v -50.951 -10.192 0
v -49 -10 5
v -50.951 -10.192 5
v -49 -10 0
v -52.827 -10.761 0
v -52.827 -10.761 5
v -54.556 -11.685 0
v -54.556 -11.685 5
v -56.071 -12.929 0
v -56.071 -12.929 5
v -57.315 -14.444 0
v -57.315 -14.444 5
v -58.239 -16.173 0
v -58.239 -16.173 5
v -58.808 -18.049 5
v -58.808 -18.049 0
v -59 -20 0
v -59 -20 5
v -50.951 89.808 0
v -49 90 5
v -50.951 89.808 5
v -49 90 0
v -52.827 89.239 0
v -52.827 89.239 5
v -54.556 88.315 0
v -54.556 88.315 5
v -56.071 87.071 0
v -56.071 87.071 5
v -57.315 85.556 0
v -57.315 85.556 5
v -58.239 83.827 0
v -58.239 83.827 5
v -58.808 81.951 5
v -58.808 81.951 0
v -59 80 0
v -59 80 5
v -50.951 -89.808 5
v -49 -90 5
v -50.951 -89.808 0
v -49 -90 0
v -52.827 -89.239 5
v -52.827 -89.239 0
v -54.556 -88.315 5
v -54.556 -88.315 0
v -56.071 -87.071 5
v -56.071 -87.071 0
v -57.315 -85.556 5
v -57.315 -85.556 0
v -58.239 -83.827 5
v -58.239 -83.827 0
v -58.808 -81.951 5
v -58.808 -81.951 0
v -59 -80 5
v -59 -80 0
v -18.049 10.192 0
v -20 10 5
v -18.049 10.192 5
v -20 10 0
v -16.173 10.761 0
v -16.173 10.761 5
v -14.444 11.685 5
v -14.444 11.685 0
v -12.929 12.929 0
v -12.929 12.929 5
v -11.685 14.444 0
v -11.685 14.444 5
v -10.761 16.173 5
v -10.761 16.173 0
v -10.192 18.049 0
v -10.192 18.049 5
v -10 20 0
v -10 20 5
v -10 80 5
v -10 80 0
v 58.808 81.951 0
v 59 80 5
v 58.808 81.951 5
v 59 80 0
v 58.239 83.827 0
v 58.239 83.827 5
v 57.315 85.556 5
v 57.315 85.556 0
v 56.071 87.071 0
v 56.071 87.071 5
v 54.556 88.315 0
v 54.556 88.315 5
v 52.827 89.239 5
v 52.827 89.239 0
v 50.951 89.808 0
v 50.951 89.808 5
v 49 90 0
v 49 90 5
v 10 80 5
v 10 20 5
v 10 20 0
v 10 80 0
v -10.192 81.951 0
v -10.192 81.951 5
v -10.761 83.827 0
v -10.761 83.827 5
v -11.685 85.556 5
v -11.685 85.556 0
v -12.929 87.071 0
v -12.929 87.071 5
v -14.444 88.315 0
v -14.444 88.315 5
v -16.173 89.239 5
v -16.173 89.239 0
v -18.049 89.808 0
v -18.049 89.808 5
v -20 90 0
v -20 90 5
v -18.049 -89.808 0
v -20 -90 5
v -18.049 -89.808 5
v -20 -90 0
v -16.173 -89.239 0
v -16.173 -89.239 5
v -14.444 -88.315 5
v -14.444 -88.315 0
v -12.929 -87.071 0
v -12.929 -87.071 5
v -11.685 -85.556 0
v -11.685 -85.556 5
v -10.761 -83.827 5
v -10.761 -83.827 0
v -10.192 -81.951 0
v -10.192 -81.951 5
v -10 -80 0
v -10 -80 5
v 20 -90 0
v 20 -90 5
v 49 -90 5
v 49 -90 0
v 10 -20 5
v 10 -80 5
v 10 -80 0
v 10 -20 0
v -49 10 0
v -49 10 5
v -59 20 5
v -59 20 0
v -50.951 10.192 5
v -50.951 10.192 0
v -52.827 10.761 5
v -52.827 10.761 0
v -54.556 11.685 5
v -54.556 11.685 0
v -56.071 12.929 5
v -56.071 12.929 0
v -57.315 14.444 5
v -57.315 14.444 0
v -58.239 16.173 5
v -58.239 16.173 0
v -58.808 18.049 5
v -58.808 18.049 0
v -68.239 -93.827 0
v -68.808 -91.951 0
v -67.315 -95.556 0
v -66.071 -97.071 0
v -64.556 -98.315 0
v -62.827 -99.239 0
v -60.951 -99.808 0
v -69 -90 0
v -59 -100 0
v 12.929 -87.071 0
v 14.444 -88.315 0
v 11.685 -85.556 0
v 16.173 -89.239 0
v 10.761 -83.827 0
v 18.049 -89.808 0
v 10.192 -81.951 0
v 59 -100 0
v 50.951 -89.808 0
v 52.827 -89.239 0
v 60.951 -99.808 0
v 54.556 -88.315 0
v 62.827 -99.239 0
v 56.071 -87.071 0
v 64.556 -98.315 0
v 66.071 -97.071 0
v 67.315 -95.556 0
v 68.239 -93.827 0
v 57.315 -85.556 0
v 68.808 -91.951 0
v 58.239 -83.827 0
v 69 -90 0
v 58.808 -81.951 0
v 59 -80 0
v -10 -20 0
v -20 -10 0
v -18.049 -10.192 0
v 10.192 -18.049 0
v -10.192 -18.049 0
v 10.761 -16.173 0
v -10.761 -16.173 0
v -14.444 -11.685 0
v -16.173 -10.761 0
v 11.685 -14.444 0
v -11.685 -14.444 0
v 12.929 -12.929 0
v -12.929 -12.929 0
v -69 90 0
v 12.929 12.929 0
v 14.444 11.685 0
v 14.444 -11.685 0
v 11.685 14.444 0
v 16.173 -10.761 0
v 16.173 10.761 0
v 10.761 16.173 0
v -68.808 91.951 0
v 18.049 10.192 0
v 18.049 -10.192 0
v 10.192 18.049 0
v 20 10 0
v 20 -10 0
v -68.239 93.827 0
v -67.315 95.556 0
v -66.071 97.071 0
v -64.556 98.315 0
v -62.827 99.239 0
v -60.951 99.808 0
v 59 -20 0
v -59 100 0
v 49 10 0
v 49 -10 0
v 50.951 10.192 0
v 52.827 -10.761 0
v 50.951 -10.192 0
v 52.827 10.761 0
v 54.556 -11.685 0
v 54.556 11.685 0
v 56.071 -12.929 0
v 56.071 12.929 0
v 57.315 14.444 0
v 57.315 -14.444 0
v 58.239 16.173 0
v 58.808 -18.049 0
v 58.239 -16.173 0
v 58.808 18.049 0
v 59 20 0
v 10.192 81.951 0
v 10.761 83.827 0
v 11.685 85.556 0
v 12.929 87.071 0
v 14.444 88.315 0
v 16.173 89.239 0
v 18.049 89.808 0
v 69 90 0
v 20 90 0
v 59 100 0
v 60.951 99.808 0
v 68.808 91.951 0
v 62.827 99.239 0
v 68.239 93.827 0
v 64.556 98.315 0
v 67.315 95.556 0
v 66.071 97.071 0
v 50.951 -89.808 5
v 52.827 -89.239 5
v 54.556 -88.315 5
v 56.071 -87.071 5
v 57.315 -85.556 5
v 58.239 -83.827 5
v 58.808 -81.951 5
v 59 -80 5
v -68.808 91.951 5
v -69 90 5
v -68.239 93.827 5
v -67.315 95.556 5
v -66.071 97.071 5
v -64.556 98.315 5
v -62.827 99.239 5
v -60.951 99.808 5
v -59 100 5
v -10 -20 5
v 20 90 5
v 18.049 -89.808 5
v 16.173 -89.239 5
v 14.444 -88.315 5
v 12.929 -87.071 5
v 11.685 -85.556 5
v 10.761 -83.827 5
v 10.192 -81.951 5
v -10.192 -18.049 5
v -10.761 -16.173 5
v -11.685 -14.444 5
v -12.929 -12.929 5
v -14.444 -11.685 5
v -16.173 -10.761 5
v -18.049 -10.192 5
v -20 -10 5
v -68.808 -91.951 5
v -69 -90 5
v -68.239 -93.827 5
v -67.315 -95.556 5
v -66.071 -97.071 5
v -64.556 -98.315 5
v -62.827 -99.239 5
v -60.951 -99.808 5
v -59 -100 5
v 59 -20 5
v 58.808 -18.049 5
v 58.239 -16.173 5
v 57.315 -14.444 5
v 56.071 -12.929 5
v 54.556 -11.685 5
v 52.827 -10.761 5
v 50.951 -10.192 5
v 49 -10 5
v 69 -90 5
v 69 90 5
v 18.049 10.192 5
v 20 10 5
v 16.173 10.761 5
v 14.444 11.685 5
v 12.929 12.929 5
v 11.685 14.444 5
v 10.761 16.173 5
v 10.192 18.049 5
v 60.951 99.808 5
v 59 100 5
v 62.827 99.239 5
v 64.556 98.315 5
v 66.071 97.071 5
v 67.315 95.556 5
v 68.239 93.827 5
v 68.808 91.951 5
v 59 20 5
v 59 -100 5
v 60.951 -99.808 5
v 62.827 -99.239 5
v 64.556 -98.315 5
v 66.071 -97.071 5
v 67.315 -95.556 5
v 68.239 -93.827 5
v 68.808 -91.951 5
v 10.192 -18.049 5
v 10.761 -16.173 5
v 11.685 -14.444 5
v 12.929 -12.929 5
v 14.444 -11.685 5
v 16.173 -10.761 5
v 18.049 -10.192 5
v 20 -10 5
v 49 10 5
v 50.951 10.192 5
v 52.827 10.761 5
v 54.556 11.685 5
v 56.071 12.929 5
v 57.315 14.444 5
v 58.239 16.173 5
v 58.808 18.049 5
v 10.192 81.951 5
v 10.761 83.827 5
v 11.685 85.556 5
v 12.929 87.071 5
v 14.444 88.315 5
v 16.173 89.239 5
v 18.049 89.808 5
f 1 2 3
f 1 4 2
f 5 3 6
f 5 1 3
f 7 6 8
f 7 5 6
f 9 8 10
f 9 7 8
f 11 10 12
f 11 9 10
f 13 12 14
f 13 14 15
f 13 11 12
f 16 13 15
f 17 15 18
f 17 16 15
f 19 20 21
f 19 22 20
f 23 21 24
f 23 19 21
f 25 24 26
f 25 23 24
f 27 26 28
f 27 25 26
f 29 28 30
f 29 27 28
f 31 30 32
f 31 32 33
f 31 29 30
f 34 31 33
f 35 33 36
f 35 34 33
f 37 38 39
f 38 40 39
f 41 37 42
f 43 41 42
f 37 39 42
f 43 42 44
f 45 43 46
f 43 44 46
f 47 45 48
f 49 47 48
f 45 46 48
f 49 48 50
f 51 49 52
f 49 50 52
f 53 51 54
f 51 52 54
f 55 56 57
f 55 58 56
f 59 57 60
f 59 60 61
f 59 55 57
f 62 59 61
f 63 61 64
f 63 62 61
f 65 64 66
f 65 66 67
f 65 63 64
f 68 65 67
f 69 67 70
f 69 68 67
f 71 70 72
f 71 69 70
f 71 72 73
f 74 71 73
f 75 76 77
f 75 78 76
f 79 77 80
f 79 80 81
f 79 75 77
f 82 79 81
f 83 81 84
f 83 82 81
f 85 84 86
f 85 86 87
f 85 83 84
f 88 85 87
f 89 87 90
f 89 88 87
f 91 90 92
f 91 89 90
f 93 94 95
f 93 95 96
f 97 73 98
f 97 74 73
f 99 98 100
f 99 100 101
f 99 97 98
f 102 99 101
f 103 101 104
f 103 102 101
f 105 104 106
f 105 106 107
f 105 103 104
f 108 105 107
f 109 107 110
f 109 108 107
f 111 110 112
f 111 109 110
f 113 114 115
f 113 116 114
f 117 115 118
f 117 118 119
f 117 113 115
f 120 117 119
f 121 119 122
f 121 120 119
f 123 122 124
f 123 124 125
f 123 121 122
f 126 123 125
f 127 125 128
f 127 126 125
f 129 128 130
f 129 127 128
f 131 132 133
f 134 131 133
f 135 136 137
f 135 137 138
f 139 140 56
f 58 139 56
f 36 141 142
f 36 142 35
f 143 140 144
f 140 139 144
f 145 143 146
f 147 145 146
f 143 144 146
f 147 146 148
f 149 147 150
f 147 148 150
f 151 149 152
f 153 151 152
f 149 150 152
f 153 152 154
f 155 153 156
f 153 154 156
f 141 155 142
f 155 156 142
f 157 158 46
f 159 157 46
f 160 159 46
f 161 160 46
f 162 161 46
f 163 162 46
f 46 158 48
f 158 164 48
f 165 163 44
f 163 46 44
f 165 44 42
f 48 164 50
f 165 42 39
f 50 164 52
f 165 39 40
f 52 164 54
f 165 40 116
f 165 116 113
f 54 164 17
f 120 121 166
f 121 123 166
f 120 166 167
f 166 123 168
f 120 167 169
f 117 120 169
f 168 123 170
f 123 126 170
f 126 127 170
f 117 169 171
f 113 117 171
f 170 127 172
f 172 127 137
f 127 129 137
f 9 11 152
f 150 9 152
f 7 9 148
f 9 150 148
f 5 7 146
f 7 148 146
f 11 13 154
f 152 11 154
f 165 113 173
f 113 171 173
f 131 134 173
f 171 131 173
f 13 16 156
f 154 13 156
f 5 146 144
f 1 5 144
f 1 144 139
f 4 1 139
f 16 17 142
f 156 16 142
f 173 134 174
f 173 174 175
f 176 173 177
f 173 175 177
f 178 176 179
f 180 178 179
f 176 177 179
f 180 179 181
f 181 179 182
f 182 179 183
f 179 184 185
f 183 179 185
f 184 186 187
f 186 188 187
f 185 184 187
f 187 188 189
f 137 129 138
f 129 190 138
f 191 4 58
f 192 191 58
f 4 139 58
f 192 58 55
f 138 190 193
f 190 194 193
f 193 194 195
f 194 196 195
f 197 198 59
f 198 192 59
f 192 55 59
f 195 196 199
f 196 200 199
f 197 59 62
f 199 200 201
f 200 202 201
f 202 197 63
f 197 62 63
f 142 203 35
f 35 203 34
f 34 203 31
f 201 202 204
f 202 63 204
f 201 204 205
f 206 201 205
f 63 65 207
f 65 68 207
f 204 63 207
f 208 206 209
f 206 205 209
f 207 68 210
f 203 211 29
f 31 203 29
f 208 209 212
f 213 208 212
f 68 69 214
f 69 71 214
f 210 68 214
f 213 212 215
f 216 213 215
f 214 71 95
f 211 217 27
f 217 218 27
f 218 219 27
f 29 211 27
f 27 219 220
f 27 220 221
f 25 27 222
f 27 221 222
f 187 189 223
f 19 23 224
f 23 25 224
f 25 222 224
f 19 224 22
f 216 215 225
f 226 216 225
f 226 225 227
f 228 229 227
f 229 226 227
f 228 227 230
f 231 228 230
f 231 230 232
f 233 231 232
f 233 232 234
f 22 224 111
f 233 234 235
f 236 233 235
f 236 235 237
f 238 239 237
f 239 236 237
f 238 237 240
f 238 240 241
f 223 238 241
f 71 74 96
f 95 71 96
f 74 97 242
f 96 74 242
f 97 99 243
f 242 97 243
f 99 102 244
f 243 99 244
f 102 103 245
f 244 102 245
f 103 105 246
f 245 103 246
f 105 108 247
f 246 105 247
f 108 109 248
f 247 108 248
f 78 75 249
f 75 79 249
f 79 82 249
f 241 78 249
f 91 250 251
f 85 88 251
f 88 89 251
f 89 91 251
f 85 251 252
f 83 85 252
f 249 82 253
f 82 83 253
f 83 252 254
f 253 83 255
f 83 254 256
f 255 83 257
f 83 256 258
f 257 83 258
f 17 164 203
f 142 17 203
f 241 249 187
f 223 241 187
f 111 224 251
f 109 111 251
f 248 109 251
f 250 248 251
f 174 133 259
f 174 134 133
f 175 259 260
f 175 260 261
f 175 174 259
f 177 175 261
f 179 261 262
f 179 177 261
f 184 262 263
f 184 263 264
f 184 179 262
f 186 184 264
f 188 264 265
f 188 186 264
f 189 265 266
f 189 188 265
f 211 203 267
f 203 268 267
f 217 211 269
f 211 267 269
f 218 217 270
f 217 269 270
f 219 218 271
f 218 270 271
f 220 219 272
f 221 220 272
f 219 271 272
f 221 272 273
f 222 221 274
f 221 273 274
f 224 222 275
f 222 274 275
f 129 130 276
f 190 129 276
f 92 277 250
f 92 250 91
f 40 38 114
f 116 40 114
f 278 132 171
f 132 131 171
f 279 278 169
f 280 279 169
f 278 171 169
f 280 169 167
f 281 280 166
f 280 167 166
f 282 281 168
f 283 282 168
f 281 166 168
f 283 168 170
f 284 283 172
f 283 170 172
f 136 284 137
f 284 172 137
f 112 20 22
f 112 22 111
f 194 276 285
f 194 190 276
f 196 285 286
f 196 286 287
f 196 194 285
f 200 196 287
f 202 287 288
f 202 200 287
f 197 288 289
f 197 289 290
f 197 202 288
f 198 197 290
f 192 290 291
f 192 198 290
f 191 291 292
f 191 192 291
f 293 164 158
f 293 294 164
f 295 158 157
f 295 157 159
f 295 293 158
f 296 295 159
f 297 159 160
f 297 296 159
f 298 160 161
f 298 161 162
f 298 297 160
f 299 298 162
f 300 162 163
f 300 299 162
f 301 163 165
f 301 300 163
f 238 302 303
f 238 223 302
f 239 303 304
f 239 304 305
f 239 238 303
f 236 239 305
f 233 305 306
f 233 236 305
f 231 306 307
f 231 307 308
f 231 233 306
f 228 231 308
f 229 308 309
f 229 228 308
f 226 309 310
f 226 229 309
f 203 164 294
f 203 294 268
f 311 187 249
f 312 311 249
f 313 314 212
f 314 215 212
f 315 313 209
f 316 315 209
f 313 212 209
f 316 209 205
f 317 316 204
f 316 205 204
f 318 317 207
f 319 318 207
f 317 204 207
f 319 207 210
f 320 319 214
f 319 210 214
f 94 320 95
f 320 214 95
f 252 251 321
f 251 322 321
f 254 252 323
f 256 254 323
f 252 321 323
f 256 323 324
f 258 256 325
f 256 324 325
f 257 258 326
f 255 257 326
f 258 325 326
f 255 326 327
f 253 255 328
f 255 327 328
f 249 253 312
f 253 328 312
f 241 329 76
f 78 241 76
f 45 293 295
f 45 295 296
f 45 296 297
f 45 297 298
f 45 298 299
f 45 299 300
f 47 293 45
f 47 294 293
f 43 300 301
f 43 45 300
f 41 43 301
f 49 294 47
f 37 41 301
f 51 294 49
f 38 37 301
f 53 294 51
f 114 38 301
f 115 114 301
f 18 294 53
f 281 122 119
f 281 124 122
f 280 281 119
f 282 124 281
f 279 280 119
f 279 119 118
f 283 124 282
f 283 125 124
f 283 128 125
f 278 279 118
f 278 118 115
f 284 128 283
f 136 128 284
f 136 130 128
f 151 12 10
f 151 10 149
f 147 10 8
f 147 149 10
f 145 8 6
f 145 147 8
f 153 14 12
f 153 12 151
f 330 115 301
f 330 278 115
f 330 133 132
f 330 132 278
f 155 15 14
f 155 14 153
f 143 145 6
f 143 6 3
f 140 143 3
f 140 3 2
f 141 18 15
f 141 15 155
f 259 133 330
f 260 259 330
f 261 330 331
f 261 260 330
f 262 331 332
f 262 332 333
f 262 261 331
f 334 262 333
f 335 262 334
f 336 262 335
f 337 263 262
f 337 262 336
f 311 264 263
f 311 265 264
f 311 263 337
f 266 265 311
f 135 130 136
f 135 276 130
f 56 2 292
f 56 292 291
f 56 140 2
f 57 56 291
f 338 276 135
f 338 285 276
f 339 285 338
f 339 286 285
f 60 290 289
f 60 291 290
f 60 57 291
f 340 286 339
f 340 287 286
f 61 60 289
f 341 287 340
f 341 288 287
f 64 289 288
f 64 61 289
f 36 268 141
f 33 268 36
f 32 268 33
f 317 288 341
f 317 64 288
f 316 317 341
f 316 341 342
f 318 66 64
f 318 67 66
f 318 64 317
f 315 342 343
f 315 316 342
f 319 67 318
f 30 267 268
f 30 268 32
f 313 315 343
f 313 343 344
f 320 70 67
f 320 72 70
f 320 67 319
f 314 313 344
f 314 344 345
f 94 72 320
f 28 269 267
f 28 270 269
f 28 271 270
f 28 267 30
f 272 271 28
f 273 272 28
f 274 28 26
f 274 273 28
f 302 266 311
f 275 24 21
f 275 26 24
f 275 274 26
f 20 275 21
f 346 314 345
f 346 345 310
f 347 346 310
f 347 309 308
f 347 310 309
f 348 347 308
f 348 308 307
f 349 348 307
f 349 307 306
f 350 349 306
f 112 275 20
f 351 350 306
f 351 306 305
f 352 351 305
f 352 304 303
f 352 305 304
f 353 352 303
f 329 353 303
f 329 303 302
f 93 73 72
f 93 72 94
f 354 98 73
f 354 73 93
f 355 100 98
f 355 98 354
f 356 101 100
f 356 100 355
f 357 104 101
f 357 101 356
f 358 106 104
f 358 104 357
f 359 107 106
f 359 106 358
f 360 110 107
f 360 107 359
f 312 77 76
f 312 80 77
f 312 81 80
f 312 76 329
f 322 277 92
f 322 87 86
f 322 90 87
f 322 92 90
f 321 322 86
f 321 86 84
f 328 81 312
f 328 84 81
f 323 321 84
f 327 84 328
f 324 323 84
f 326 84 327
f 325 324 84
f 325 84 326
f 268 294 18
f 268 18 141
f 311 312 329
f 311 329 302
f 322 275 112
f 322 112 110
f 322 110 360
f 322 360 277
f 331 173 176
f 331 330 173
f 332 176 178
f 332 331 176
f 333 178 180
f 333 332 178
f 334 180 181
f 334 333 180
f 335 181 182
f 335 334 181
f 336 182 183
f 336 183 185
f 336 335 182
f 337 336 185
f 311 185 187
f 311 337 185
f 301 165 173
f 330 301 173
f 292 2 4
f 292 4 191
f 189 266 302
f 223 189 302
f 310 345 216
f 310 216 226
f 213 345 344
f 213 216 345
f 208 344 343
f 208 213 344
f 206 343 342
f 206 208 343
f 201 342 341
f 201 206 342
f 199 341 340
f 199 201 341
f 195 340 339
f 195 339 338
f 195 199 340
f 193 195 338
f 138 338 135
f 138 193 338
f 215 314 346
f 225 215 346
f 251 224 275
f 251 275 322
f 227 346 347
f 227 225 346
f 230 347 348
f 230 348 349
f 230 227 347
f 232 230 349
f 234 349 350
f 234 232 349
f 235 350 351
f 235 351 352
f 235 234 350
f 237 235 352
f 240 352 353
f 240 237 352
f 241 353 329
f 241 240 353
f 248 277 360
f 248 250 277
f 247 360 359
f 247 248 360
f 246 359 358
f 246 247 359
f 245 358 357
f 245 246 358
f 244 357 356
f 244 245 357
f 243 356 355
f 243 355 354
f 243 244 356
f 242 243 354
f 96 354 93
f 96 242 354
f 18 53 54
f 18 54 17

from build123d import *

# Parameters (mm, degrees)
SKETCH_1_W          = 138
SKETCH_1_H          = 200
EXTRUDE_1_DEPTH     = 5
SKETCH_2_W          = 49
SKETCH_2_H          = 80
CUT_EXTRUDE_2_DEPTH = 5
FILLET_1_R          = 10


with BuildPart() as part:
    # 草图1 → 凸台-拉伸1 (new body)
    with BuildSketch(Plane.XY):
        Rectangle(SKETCH_1_W, SKETCH_1_H)
    extrude(amount=EXTRUDE_1_DEPTH)

    # 草图2 → 切除-拉伸2 (cut)
    with BuildSketch(Plane.XY.offset(5)):
        with Locations((34.5, 50)):
            Rectangle(SKETCH_2_W, SKETCH_2_H)
        with Locations((-34.5, 50)):
            Rectangle(SKETCH_2_W, SKETCH_2_H)
        with Locations((34.5, -50)):
            Rectangle(SKETCH_2_W, SKETCH_2_H)
        with Locations((-34.5, -50)):
            Rectangle(SKETCH_2_W, SKETCH_2_H)
    extrude(amount=-CUT_EXTRUDE_2_DEPTH, mode=Mode.SUBTRACT)

    # 圆角1
    fillet_1_edges = [part.edges().sort_by_distance(p)[0] for p in [
        (-10, 90, 2.5),
        (-10, 10, 2.5),
        (-59, 10, 2.5),
        (-59, 90, 2.5),
        (10, -90, 2.5),
        (10, -10, 2.5),
        (59, -10, 2.5),
        (59, -90, 2.5),
        (-10, -90, 2.5),
        (-59, -90, 2.5),
        (-59, -10, 2.5),
        (-10, -10, 2.5),
        (10, 10, 2.5),
        (10, 90, 2.5),
        (59, 90, 2.5),
        (59, 10, 2.5),
        (-69, 100, 2.5),
        (69, 100, 2.5),
        (69, -100, 2.5),
        (-69, -100, 2.5),
    ]]
    fillet(fillet_1_edges, radius=FILLET_1_R)


solid = part.part
